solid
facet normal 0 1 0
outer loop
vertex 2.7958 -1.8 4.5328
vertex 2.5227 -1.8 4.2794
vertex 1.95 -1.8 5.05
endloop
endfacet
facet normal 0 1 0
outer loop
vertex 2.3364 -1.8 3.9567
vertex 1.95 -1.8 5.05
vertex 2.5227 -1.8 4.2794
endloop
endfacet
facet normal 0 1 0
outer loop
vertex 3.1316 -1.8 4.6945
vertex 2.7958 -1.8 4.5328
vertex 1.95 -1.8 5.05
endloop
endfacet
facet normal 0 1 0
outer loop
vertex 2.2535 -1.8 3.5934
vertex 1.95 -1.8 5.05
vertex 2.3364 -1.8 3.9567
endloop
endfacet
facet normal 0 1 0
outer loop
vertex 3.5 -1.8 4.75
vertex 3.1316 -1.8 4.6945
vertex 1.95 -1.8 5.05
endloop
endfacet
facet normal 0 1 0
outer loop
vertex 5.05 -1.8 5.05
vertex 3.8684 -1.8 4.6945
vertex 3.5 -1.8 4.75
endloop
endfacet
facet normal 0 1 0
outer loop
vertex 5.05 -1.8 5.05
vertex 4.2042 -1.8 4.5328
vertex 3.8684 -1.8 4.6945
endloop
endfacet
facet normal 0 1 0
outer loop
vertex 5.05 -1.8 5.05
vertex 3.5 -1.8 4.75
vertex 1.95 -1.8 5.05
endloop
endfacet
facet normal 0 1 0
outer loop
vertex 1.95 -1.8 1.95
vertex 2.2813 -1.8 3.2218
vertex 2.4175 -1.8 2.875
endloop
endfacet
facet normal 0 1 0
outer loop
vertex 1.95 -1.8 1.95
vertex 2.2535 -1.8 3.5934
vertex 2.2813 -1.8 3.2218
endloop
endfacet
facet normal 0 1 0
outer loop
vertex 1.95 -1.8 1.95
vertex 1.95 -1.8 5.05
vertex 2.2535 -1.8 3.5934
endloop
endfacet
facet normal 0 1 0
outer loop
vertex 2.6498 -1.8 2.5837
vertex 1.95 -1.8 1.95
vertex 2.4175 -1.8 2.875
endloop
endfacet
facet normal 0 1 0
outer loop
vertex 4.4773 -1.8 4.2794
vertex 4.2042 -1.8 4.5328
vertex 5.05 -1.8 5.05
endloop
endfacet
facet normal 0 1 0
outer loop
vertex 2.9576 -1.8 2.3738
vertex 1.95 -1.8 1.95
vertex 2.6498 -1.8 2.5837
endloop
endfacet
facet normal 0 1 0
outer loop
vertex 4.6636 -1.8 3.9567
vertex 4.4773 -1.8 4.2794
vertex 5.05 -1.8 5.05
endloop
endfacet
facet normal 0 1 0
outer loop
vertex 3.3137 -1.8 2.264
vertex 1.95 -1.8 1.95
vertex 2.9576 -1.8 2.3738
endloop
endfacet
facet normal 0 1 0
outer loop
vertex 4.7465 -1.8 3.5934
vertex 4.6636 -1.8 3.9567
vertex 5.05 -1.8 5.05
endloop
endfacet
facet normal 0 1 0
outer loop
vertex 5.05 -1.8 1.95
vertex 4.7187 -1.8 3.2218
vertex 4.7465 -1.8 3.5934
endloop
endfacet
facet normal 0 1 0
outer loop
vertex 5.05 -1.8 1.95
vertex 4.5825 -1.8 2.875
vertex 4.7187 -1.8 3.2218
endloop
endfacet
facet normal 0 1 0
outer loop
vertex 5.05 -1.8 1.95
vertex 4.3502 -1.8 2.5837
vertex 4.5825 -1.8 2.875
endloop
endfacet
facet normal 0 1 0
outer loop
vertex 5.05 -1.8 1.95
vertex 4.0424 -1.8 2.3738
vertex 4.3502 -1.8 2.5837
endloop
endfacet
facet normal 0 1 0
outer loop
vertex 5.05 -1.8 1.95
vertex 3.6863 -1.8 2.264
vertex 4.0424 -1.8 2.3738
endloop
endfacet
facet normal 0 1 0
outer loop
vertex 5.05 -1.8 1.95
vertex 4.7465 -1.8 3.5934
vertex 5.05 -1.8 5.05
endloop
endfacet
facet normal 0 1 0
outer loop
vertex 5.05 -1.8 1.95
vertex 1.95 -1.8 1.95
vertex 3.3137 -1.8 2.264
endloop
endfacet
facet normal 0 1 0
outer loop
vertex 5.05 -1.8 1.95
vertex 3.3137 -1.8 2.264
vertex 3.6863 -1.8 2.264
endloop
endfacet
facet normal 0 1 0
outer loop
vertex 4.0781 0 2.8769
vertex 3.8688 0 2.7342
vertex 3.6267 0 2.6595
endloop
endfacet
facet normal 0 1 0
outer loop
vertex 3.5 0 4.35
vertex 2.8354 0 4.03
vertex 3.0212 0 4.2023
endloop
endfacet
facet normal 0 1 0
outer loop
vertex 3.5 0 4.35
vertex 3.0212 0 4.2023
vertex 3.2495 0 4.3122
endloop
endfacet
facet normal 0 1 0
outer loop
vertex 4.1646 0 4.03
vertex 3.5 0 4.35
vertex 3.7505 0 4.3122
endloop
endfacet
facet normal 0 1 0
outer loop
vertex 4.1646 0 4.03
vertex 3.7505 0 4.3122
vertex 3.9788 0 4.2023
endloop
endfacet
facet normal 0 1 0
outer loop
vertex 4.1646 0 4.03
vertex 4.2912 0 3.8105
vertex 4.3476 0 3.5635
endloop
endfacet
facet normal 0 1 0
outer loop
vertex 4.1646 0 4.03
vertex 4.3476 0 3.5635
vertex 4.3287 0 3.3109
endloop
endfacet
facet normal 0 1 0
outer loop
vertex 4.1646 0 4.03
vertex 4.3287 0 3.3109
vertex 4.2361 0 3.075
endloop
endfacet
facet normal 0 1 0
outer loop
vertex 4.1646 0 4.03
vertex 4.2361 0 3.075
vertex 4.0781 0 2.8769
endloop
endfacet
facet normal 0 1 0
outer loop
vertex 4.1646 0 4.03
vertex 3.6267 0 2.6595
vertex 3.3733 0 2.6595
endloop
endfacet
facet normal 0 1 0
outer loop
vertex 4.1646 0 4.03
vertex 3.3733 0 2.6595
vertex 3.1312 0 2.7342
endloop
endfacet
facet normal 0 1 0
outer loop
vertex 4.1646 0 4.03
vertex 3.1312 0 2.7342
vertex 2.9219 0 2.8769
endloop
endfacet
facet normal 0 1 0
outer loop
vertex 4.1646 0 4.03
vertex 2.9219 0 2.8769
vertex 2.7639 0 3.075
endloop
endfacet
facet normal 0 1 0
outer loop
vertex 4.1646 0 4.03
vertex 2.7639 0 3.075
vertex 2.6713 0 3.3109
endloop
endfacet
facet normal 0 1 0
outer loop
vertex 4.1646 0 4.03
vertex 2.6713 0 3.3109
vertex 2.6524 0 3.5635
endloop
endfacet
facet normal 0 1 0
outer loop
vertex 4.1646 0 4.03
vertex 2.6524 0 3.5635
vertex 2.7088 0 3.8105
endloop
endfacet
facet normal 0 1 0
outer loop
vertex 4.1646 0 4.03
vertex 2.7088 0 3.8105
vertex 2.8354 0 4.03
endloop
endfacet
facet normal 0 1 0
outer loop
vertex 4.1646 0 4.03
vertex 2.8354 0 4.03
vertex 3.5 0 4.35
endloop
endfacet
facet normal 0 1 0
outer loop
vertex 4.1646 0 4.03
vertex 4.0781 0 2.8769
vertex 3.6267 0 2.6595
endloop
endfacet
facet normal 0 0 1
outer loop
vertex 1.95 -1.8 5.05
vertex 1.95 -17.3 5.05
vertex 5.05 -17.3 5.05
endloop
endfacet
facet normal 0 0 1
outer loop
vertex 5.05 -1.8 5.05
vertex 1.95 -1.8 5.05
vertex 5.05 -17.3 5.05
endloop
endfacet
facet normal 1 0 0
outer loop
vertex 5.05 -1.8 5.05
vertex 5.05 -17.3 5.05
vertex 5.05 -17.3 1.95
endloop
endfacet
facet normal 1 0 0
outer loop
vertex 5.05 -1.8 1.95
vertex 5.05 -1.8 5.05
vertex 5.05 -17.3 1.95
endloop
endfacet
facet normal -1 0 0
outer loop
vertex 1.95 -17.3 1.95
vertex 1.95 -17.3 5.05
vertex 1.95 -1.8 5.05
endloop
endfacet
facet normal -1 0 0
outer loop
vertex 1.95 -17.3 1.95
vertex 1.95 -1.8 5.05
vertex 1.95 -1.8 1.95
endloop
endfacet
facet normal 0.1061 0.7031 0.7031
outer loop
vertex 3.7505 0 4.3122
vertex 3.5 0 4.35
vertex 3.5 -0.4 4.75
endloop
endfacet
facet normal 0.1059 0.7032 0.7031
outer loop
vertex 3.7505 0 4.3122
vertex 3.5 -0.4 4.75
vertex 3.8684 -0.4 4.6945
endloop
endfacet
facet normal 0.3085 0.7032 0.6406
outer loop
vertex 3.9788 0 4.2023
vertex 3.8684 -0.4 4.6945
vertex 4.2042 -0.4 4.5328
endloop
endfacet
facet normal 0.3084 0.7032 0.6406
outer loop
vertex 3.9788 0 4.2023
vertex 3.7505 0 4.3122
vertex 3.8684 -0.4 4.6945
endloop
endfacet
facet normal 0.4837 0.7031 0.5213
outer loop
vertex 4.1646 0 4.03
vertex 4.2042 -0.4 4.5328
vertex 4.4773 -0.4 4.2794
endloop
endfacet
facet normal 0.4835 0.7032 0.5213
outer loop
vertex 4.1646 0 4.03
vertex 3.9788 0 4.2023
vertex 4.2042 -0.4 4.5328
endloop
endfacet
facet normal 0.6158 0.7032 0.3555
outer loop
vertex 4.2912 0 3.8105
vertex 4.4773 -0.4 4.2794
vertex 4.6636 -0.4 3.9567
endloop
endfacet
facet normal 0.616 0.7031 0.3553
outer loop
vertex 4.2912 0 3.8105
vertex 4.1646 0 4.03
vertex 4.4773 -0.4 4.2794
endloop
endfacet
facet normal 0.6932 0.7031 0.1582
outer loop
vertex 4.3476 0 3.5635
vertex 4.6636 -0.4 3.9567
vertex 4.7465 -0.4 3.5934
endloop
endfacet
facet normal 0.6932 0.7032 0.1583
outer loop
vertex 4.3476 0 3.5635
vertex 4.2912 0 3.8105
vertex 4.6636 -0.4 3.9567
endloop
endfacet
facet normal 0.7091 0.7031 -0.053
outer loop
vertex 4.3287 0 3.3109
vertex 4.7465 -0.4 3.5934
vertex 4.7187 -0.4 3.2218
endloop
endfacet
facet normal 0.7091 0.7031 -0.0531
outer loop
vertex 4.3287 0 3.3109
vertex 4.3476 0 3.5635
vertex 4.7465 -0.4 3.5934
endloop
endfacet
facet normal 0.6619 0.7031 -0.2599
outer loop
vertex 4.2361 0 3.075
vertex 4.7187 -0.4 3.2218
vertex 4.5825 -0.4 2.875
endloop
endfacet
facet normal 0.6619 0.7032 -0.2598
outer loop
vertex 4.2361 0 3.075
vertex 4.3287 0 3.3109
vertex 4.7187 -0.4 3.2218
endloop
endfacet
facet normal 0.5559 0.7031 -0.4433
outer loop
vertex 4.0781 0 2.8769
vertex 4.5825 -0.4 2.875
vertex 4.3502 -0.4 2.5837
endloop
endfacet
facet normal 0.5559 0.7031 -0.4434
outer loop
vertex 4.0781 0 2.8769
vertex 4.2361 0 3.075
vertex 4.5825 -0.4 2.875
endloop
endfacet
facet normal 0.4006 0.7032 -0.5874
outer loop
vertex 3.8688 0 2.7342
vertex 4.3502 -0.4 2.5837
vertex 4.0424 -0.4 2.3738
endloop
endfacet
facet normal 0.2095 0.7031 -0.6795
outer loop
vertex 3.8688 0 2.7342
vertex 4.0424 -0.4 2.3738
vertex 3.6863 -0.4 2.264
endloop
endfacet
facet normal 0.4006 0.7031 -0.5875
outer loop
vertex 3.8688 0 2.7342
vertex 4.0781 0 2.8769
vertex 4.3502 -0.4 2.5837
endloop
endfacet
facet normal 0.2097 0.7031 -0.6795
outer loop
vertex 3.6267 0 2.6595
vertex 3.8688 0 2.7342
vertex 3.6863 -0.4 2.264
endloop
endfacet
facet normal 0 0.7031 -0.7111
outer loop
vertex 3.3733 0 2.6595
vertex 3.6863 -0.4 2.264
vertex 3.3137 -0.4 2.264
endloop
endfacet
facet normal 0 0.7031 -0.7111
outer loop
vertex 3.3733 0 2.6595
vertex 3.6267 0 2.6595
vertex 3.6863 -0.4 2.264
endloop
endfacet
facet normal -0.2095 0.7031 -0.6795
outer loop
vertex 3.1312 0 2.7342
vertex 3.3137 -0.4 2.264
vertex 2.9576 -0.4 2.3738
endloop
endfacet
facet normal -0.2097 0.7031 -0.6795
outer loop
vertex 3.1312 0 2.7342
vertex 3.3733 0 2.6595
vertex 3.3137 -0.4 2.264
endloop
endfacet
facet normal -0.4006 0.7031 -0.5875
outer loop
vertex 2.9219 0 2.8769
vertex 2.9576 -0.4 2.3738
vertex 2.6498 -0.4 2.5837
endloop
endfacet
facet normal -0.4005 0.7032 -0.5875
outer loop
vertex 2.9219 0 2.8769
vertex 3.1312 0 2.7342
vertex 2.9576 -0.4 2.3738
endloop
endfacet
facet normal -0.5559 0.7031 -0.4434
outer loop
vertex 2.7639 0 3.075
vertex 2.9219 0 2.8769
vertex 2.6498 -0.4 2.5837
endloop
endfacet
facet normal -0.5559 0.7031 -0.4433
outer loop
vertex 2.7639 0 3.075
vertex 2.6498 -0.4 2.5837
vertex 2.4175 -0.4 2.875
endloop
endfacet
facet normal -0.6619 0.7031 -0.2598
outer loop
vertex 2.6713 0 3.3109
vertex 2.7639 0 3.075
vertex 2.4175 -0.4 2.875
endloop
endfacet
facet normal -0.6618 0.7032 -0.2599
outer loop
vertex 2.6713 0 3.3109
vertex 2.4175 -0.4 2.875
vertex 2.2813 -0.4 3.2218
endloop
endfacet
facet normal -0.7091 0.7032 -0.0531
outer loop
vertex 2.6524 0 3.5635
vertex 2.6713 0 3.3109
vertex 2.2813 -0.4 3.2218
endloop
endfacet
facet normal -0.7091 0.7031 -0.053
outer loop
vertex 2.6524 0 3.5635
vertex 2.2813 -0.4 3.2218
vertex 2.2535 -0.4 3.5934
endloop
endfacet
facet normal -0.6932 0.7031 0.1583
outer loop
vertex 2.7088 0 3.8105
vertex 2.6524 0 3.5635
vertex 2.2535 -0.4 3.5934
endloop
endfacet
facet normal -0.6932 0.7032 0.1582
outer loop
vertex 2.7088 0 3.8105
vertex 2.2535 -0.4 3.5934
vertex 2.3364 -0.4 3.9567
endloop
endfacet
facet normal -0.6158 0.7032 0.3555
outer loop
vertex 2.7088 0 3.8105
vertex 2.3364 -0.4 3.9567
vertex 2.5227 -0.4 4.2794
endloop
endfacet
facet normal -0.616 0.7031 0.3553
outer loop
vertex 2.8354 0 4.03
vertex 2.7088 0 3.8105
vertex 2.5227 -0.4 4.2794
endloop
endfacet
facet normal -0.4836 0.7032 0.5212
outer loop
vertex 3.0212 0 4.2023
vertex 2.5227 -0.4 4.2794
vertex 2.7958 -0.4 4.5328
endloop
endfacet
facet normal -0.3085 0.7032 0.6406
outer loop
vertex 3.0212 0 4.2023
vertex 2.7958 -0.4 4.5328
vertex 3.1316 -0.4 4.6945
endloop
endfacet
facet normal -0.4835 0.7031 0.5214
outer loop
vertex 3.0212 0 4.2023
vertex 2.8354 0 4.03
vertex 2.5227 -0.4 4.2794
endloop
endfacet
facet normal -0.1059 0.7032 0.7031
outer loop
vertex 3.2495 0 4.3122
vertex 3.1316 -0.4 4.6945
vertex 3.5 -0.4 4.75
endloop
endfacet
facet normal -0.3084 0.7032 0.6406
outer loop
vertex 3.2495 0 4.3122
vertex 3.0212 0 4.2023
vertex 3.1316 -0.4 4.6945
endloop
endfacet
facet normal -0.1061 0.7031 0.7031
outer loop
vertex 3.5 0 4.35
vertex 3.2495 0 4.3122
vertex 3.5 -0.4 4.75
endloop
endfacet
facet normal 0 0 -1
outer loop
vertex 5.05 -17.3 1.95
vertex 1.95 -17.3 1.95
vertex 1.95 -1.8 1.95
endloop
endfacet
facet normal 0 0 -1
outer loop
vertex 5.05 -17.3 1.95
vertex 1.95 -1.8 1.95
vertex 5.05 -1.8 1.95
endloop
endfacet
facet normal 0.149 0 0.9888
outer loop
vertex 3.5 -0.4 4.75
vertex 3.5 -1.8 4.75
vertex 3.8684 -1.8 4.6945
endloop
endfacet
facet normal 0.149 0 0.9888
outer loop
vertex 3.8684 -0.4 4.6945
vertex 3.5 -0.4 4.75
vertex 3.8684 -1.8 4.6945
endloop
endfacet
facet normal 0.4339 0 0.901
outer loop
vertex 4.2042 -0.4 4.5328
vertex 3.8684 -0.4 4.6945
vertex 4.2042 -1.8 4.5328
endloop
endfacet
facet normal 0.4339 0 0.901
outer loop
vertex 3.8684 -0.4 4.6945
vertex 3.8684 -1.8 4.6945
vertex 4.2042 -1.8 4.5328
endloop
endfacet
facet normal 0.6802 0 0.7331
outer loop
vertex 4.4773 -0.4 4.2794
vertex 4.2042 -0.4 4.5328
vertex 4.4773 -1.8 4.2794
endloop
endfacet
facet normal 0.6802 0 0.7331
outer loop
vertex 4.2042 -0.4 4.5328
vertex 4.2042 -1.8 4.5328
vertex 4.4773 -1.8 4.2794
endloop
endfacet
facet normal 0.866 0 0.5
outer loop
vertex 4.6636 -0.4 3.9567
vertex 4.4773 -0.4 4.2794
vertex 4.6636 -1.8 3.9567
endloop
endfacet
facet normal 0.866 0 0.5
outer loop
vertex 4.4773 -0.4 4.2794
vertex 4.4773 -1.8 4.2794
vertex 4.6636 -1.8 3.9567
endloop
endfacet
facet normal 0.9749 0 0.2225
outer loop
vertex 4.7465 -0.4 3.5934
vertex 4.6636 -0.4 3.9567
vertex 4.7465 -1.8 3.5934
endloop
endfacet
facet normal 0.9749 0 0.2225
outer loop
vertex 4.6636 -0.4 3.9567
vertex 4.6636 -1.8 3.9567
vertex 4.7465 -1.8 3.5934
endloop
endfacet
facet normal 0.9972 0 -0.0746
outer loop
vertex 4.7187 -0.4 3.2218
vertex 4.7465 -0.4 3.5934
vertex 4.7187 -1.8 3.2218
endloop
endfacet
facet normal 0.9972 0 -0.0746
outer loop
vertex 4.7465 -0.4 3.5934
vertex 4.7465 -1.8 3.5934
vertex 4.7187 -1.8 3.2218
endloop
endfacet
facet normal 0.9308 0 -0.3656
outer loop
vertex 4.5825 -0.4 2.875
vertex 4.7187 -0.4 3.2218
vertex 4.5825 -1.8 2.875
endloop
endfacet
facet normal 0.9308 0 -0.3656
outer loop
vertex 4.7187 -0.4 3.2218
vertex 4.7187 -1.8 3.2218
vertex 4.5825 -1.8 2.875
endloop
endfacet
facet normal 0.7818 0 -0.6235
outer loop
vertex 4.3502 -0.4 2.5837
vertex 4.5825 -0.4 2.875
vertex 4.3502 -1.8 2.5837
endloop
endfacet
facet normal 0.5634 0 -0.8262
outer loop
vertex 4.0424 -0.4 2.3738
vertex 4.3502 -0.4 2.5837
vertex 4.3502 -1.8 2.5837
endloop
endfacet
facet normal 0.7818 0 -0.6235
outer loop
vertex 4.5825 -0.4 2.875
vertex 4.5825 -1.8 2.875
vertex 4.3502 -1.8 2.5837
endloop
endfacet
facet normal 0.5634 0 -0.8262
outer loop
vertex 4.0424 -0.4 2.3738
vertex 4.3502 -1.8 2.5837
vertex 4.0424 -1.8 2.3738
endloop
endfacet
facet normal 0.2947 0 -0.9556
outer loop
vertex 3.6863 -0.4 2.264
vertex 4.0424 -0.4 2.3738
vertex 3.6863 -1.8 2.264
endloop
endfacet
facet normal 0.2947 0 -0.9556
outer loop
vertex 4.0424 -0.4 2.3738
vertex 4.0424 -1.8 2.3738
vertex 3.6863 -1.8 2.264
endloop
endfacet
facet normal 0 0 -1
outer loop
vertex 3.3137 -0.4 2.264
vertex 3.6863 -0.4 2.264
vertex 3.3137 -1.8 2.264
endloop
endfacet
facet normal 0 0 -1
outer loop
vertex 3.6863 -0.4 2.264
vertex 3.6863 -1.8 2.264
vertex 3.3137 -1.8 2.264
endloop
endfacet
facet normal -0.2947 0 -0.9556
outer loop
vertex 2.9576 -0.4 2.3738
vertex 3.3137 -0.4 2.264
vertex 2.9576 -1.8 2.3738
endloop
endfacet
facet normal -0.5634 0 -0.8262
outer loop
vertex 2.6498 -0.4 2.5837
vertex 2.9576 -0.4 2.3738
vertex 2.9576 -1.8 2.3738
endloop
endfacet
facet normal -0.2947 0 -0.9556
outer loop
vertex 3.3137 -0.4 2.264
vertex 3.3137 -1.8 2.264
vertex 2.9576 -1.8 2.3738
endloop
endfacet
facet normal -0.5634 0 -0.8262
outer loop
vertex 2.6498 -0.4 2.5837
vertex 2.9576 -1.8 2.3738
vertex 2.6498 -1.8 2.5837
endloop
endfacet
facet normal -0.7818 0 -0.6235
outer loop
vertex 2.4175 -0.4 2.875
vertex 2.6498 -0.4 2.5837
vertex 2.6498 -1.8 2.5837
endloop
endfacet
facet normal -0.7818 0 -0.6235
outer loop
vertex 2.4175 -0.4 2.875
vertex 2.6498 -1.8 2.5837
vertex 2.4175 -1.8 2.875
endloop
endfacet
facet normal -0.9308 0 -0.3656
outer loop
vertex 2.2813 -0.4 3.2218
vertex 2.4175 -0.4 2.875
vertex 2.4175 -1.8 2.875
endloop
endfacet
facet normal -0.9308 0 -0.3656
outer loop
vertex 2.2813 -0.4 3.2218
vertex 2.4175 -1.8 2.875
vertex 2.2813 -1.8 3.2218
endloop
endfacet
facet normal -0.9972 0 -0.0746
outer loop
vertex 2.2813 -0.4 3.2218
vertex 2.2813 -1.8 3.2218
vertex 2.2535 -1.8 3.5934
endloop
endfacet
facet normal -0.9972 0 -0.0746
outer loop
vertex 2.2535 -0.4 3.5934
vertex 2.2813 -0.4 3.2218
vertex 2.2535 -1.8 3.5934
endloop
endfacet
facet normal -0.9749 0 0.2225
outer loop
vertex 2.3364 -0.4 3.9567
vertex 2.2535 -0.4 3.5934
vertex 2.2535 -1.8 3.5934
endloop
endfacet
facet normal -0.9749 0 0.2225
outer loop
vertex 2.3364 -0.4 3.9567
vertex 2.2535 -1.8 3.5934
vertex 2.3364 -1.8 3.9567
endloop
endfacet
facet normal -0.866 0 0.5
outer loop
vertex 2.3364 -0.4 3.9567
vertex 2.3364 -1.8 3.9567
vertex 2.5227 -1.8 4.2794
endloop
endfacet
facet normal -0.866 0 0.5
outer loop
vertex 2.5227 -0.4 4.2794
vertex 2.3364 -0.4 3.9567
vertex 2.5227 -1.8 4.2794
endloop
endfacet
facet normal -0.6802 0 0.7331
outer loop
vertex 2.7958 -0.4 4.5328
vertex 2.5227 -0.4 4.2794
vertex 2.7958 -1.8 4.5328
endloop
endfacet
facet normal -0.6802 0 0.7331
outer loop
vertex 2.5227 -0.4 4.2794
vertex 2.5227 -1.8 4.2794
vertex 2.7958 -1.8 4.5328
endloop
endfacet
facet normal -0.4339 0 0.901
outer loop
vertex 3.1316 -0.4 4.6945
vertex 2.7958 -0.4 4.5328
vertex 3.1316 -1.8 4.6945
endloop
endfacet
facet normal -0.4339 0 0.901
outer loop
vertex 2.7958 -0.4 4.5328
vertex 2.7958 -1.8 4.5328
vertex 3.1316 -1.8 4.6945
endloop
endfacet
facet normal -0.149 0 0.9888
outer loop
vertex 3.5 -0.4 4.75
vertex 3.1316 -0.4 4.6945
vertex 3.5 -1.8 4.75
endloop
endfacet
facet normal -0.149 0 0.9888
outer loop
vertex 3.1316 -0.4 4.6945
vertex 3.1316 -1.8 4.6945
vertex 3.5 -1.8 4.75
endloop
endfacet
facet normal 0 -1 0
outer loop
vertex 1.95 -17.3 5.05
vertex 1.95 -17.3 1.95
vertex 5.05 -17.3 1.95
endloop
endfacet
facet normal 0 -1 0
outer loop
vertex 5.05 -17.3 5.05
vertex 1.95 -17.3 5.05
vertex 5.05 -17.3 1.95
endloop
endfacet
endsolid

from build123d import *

# Parameters (mm, degrees)
AUFSATZ_LINEAR_AUSTRAGEN1_OUTLINE_W = 3.1
AUFSATZ_LINEAR_AUSTRAGEN1_OUTLINE_H = 3.1
AUFSATZ_LINEAR_AUSTRAGEN1_DEPTH     = 15.5
SKIZZE2_R                           = 1.25
AUFSATZ_LINEAR_AUSTRAGEN2_DEPTH     = 1.8
FASE1_SIZE                          = 0.4


# Read off the part's stored shape, not the designer's step: Aufsatz-Linear austragen1
with BuildPart() as part:
    # Aufsatz-Linear austragen1 outline → Aufsatz-Linear austragen1 (new body)
    with BuildSketch(Plane(origin=(0, -17.3, 0), x_dir=(1, 0, 0), z_dir=(0, 1, 0))):
        with Locations((3.5, -3.5)):
            Rectangle(AUFSATZ_LINEAR_AUSTRAGEN1_OUTLINE_W, AUFSATZ_LINEAR_AUSTRAGEN1_OUTLINE_H)
    extrude(amount=AUFSATZ_LINEAR_AUSTRAGEN1_DEPTH)

    # Skizze2 → Aufsatz-Linear austragen2 (add)
    with BuildSketch(Plane(origin=(0, -1.8, 0), x_dir=(1, 0, 0), z_dir=(0, 1, 0))):
        with Locations(Location((3.5, -3.5, 0), (0, 0, 270))):
            Circle(SKIZZE2_R)
    extrude(amount=AUFSATZ_LINEAR_AUSTRAGEN2_DEPTH)

    # Fase1
    fase1_edges = [part.edges().sort_by_distance(p)[0] for p in [
        (3.5, 0, 2.25),
    ]]
    chamfer(fase1_edges, length=FASE1_SIZE)


solid = part.part
